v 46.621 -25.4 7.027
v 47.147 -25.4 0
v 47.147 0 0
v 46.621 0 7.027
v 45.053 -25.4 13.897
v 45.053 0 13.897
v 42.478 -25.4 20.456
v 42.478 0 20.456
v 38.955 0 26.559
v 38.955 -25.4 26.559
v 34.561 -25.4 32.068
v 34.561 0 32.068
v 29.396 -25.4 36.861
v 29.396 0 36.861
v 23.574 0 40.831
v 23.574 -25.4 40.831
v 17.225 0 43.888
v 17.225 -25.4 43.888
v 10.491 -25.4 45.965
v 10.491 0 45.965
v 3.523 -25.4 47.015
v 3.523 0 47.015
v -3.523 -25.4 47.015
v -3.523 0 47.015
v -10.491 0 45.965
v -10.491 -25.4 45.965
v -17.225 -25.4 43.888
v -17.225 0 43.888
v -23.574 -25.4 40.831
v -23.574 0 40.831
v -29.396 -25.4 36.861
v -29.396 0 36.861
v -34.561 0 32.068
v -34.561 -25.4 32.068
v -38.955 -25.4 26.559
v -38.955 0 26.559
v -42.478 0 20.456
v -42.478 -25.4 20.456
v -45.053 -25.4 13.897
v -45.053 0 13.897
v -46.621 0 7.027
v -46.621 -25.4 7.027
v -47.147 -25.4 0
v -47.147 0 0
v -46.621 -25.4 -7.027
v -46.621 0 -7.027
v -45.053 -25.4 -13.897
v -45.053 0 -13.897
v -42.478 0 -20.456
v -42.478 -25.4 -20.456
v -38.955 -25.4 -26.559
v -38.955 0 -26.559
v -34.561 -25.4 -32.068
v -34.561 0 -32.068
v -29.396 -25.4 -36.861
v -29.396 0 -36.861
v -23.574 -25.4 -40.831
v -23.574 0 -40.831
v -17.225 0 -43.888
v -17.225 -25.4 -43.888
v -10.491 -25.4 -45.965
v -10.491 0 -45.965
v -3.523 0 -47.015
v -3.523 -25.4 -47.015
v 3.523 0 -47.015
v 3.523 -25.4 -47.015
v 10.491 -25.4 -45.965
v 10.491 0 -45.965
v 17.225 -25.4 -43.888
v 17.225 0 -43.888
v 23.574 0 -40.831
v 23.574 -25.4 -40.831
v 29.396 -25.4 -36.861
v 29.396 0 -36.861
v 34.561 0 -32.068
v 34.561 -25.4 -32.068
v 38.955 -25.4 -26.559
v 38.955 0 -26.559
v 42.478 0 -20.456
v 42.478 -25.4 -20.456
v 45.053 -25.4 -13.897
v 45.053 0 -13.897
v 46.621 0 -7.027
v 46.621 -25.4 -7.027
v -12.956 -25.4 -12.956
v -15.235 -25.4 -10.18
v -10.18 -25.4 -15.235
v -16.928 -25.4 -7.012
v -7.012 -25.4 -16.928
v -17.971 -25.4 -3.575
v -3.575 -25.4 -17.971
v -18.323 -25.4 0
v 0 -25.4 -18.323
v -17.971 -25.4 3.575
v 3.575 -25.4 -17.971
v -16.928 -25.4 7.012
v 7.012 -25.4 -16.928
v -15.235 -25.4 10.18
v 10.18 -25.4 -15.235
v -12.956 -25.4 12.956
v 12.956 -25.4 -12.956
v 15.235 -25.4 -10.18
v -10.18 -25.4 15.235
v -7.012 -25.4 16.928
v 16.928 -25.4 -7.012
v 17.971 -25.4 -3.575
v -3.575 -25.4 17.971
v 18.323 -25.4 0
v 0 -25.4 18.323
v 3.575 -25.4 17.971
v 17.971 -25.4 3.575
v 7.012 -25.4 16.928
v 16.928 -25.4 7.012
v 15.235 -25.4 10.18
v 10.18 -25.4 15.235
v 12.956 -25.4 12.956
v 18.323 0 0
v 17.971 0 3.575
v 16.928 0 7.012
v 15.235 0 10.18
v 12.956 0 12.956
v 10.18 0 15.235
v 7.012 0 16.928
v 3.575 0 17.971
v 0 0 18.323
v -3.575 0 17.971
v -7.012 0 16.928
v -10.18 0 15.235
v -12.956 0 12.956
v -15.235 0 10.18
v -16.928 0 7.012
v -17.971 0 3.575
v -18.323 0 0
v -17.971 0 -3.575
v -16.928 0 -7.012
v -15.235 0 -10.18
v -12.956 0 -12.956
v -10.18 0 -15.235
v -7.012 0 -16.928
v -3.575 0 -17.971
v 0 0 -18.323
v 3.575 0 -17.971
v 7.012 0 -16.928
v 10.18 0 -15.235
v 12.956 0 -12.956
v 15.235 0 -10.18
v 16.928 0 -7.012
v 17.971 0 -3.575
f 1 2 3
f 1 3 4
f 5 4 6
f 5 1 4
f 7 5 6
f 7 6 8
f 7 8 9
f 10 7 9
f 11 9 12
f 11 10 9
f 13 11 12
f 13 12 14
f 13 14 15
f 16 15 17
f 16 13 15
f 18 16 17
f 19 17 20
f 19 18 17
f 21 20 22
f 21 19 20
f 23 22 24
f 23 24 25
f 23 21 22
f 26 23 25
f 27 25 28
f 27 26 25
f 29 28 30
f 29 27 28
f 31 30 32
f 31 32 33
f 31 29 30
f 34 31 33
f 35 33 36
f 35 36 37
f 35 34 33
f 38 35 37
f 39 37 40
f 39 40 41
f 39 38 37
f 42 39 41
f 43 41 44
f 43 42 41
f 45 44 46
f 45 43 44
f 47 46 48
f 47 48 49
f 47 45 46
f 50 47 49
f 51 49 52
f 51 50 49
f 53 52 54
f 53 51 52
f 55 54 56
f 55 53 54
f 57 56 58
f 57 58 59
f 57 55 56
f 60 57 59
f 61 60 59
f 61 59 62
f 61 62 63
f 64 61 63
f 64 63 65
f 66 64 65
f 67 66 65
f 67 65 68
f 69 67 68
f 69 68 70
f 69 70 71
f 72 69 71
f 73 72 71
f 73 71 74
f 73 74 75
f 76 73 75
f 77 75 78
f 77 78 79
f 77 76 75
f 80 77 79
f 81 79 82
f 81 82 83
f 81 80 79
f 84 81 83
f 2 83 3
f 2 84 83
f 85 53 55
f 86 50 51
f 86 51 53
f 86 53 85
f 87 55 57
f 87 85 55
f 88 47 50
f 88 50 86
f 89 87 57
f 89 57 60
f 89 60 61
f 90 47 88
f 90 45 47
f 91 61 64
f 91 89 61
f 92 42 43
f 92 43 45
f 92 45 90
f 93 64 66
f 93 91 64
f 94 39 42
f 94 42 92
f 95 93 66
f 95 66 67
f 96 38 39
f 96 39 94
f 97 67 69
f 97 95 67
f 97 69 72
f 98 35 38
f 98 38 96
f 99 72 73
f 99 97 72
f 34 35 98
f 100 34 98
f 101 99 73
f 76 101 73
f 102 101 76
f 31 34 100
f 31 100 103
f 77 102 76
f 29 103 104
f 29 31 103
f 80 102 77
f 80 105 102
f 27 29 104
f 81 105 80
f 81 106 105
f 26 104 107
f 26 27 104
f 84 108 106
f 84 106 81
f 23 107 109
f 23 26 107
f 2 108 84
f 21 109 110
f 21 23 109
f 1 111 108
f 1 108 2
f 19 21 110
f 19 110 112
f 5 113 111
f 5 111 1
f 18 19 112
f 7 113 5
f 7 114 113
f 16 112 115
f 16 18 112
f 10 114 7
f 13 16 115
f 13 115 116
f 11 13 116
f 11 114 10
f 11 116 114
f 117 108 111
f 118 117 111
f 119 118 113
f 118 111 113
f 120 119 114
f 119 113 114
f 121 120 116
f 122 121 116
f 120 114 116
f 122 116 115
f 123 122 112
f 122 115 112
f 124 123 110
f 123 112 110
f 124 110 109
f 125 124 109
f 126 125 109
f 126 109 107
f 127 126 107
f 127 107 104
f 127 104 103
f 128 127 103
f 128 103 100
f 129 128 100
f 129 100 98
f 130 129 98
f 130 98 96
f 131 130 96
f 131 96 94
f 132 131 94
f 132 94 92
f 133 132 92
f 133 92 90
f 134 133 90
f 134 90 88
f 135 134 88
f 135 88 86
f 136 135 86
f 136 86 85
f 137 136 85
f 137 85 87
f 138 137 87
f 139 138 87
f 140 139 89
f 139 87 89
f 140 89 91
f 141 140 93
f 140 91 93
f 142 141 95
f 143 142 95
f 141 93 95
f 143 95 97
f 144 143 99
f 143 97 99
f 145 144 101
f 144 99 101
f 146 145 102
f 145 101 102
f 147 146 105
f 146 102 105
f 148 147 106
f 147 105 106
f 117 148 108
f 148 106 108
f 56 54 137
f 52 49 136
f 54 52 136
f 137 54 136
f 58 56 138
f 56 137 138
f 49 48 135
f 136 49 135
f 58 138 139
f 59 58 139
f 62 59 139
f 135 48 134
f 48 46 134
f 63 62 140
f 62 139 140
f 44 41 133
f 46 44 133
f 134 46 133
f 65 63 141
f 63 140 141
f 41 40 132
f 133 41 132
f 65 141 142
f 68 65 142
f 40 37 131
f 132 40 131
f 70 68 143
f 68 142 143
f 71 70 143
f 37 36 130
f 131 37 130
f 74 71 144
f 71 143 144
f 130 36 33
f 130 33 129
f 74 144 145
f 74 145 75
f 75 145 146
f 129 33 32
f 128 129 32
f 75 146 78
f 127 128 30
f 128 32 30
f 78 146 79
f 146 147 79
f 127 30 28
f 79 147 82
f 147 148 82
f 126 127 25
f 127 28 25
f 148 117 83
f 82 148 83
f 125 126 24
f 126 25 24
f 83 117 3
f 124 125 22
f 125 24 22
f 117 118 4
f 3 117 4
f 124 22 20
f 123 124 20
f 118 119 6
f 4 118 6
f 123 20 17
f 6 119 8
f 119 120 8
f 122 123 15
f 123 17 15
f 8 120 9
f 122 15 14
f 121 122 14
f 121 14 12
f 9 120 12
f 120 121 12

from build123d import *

# Parameters (mm, degrees)
F0_R     = 74.956114
F1_DEPTH = 25.4
F2_R     = 47.147248
F3_DEPTH = 25.4
F5_R     = 18.322867
F4_DEPTH = 73.656926


with BuildPart() as f1:
    # F0 (on Front) → F1 (new body)
    with BuildSketch(Plane.XZ):
        Circle(F0_R)
    extrude(amount=F1_DEPTH)

    # F2 (on face) → F3 (intersect)
    with BuildSketch(Plane.XZ.offset(25.4)):
        Circle(F2_R)
    extrude(amount=-F3_DEPTH, mode=Mode.INTERSECT)

    # F5 (on face) → F4 (cut)
    with BuildSketch(Plane.XZ.offset(25.4)):
        Circle(F5_R)
    extrude(amount=-F4_DEPTH, mode=Mode.SUBTRACT)


solid = f1.part
